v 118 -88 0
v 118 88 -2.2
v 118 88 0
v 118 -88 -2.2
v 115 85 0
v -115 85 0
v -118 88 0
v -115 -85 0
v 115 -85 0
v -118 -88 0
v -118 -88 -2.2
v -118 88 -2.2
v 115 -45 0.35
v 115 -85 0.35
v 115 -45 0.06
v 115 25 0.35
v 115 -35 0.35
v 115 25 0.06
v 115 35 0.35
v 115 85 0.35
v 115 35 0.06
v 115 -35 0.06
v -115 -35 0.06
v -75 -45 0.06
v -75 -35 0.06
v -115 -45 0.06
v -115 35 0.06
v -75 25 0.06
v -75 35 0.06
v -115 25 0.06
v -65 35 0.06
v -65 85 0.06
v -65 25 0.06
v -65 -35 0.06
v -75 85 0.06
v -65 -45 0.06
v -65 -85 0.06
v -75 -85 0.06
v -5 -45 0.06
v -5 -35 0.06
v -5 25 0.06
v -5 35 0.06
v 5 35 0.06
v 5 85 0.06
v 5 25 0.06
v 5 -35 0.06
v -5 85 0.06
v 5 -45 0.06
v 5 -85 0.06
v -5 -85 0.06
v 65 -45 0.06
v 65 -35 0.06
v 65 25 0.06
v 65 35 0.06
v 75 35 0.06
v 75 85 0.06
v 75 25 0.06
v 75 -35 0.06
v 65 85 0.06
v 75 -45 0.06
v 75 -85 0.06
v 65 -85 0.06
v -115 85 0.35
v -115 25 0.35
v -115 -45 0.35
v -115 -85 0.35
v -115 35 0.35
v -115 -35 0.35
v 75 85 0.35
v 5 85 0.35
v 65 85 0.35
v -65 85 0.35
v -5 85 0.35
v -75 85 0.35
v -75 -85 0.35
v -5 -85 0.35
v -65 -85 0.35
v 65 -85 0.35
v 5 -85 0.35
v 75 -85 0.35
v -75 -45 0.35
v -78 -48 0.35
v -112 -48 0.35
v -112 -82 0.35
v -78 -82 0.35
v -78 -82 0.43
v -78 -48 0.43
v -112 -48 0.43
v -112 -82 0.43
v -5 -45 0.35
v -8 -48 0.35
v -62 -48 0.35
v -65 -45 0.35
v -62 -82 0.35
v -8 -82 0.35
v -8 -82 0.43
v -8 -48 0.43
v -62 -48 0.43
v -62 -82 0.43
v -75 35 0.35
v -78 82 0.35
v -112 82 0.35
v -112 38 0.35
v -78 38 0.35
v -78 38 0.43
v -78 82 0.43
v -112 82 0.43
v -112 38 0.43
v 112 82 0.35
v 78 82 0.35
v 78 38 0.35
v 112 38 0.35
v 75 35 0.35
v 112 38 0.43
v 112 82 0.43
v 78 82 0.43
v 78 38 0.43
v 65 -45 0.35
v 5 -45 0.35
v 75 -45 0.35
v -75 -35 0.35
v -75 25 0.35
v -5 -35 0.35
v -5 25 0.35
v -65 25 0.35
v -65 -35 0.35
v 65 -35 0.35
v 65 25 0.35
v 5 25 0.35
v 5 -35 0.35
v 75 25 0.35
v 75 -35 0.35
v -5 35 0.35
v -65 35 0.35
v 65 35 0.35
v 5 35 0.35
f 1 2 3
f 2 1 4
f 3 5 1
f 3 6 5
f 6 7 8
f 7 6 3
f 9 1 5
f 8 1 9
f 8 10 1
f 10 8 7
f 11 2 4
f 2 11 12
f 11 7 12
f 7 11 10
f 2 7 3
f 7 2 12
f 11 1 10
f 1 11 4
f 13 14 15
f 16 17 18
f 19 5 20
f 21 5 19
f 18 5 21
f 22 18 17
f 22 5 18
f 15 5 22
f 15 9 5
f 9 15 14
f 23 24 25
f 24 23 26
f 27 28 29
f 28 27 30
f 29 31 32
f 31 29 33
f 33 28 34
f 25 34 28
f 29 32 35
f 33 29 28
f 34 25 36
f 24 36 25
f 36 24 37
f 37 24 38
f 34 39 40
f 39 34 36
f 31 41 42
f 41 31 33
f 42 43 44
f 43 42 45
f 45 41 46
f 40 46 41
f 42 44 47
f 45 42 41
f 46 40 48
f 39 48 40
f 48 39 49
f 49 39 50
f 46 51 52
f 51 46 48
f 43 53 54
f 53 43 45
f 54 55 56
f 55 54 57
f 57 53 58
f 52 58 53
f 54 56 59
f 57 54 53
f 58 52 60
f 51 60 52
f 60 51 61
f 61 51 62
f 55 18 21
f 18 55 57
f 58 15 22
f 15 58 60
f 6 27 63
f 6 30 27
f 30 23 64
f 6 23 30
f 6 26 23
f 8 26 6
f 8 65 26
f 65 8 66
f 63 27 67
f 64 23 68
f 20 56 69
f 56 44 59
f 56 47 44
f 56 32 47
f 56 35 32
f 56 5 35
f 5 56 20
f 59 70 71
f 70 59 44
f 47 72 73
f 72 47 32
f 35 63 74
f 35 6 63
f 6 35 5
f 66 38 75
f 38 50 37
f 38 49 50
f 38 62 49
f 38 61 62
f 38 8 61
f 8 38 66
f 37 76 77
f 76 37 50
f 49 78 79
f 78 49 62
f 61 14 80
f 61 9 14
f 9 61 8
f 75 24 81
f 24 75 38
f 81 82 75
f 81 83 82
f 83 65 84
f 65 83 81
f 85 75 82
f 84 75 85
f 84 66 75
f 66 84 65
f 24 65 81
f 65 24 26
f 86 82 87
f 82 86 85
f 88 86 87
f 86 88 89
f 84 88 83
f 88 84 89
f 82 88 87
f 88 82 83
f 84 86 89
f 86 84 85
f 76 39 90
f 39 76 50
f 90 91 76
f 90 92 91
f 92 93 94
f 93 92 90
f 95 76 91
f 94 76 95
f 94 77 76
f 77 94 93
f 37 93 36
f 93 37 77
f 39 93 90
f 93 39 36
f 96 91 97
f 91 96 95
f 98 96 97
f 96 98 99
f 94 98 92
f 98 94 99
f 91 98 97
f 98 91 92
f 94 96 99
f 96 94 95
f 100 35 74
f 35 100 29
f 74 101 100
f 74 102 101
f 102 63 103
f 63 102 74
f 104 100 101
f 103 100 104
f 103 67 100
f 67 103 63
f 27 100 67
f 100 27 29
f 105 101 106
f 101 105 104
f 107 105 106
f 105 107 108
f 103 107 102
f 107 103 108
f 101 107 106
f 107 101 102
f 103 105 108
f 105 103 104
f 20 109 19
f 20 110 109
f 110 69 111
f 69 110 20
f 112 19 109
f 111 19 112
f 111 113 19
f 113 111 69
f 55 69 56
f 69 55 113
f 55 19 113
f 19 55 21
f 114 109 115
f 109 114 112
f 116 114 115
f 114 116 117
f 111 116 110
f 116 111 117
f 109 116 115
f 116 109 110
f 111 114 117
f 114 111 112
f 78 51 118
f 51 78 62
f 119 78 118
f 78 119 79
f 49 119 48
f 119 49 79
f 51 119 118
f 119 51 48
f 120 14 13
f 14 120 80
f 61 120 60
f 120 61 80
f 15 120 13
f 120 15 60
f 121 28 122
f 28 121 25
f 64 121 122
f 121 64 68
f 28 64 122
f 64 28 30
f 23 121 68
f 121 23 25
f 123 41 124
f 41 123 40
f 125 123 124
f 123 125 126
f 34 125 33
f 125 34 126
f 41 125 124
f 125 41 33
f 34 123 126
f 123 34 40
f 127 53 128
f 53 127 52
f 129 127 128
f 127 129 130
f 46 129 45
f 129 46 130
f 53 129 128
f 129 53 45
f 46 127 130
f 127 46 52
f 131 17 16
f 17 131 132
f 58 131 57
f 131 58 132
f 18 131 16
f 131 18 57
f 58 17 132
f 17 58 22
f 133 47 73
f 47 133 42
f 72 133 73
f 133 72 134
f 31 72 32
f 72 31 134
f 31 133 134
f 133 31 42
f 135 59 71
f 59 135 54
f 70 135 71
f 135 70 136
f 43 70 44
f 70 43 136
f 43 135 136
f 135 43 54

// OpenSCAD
// file: common.scad
// ============================================================
// Modern City Diorama - 共享参数 / 配色 / 基础工具
// 单位近似：1 unit ≈ 1 米
// ============================================================

$fn = 24;

// ---- 地块总体尺寸 ----
function tile_w() = 230;     // X 方向
function tile_d() = 170;     // Y 方向
function base_h() = 2.2;     // 展台底座厚度

// ---- 道路网格 ----
function road_w() = 10;      // 双车道宽
function road_t() = 0.15;    // 路面厚
function curb_h() = 0.35;    // 街区台面(人行道)高
function vroads() = [-70, 0, 70];   // 纵向道路中心 x
function hroads() = [-40, 30];      // 横向道路中心 y

// ---- 配色（低多边形卡通风）----
function c_base()   = [0.78, 0.79, 0.80];
function c_pave()   = [0.88, 0.88, 0.86];
function c_road()   = [0.27, 0.29, 0.31];
function c_lot()    = [0.45, 0.47, 0.49];
function c_mark()   = [0.93, 0.93, 0.92];
function c_grass()  = [0.55, 0.78, 0.30];
function c_leaf()   = [0.45, 0.72, 0.22];
function c_leaf_d() = [0.33, 0.60, 0.18];
function c_trunk()  = [0.42, 0.28, 0.16];

function c_white()  = [0.95, 0.95, 0.94];
function c_cream()  = [0.95, 0.90, 0.77];
function c_beige()  = [0.90, 0.81, 0.66];
function c_grey()   = [0.63, 0.65, 0.67];
function c_dgrey()  = [0.36, 0.38, 0.40];
function c_dark()   = [0.16, 0.17, 0.18];

function c_red()    = [0.86, 0.22, 0.18];
function c_blue()   = [0.27, 0.56, 0.84];
function c_dblue()  = [0.15, 0.32, 0.55];
function c_orange() = [0.92, 0.58, 0.24];
function c_brown()  = [0.35, 0.23, 0.14];
function c_yellow() = [0.96, 0.78, 0.18];
function c_glass()  = [0.52, 0.72, 0.90];

// ---- 基础工具 ----
module boxc(s) { cube(s, center=true); }

// 置于 z=0 之上的平板
module slab(L, W, t) {
    translate([0, 0, t/2]) boxc([L, W, t]);
}

// 低多边形球（树冠等）
module blob(r) { sphere(r=r, $fn=8); }

// 屋顶女儿墙
module parapet(L, D, t=0.5, h=0.6) {
    difference() {
        translate([0, 0, h/2]) boxc([L, D, h]);
        translate([0, 0, h/2]) boxc([L - 2*t, D - 2*t, h + 0.2]);
    }
}

// 屋顶空调外机
module ac_unit() {
    color(c_grey())  translate([0, 0, 0.5]) boxc([1.7, 1.2, 1.0]);
    color(c_dgrey()) translate([0.35, 0, 1.02]) cylinder(h=0.08, r=0.42, $fn=12);
    color(c_dgrey()) translate([-0.55, 0, 1.02]) boxc([0.35, 0.9, 0.06]);
}

// 条纹遮阳棚：挂点在本地原点，向 -Y 出挑并下倾
module awning(W=8, D=1.7, ca=[0.86,0.22,0.18], cb=[0.95,0.95,0.94], n=6) {
    rotate([18, 0, 0])
    for (i = [0 : n-1]) {
        color(i % 2 == 0 ? ca : cb)
        translate([-W/2 + (i + 0.5)*W/n, -D/2, 0])
        boxc([W/n + 0.02, D, 0.14]);
    }
}

// 双坡屋顶（小住宅用）
module gable_roof(L=10, D=8, H=2.6, over=0.8, c=[0.86,0.22,0.18]) {
    color(c)
    polyhedron(
        points = [
            [-(L/2+over), -(D/2+over), 0],
            [ (L/2+over), -(D/2+over), 0],
            [ (L/2+over),  (D/2+over), 0],
            [-(L/2+over),  (D/2+over), 0],
            [-(L/2+over),  0,          H],
            [ (L/2+over),  0,          H]
        ],
        faces = [
            [0,1,2,3],
            [0,4,5,1],
            [3,2,5,4],
            [0,3,4],
            [1,5,2]
        ]
    );
}

// 标准预览
translate([-8, 0, 0]) ac_unit();
awning();
translate([10, 0, 2]) gable_roof();
// main file
// ============================================================
// Modern City Diorama - 展台底座 / 街区台面 / 草地
// ============================================================

$fn = 24;

use <common.scad>

// 展台底座 + 整体铺装层
module display_base() {
    color(c_base())
    translate([0, 0, -base_h()])
    slab(tile_w() + 6, tile_d() + 6, base_h());

    color(c_pave())
    slab(tile_w(), tile_d(), 0.06);
}

// 单个街区台面（人行道，带路缘高度）
module block_plate(W, D) {
    color(c_pave()) slab(W, D, curb_h());
}

module grass_patch(W, D) {
    color(c_grass())
    translate([0, 0, curb_h()])
    slab(W, D, 0.08);
}

// 12 个街区：列 x = -95 / -35 / 35 / 95，行 y = -65 / -5 / 60
module city_blocks() {
    // 第 1 行 (y=-65, 深 40)
    translate([-95, -65, 0]) { block_plate(40, 40); grass_patch(34, 34); }  // A1 通讯塔草坪
    translate([-35, -65, 0]) { block_plate(60, 40); grass_patch(54, 34); }  // B1 住宅
    translate([ 35, -65, 0]) block_plate(60, 40);                           // C1 球场
    translate([ 95, -65, 0]) block_plate(40, 40);                           // D1 旅馆

    // 第 2 行 (y=-5, 深 60)
    translate([-95, -5, 0]) block_plate(40, 60);                            // A2 写字楼
    translate([-35, -5, 0]) block_plate(60, 60);                            // B2 快餐+广场
    translate([ 35, -5, 0]) block_plate(60, 60);                            // C2 警局+咖啡+酒店
    translate([ 95, -5, 0]) block_plate(40, 60);                            // D2 商铺街

    // 第 3 行 (y=60, 深 50)
    translate([-95, 60, 0]) { block_plate(40, 50); grass_patch(34, 44); }   // A3 公园
    translate([-35, 60, 0]) block_plate(60, 50);                            // B3 医院
    translate([ 35, 60, 0]) block_plate(60, 50);                            // C3 商业
    translate([ 95, 60, 0]) { block_plate(40, 50); grass_patch(34, 44); }   // D3 公寓
}

module city_ground() {
    display_base();
    city_blocks();
}

// 标准预览
city_ground();
